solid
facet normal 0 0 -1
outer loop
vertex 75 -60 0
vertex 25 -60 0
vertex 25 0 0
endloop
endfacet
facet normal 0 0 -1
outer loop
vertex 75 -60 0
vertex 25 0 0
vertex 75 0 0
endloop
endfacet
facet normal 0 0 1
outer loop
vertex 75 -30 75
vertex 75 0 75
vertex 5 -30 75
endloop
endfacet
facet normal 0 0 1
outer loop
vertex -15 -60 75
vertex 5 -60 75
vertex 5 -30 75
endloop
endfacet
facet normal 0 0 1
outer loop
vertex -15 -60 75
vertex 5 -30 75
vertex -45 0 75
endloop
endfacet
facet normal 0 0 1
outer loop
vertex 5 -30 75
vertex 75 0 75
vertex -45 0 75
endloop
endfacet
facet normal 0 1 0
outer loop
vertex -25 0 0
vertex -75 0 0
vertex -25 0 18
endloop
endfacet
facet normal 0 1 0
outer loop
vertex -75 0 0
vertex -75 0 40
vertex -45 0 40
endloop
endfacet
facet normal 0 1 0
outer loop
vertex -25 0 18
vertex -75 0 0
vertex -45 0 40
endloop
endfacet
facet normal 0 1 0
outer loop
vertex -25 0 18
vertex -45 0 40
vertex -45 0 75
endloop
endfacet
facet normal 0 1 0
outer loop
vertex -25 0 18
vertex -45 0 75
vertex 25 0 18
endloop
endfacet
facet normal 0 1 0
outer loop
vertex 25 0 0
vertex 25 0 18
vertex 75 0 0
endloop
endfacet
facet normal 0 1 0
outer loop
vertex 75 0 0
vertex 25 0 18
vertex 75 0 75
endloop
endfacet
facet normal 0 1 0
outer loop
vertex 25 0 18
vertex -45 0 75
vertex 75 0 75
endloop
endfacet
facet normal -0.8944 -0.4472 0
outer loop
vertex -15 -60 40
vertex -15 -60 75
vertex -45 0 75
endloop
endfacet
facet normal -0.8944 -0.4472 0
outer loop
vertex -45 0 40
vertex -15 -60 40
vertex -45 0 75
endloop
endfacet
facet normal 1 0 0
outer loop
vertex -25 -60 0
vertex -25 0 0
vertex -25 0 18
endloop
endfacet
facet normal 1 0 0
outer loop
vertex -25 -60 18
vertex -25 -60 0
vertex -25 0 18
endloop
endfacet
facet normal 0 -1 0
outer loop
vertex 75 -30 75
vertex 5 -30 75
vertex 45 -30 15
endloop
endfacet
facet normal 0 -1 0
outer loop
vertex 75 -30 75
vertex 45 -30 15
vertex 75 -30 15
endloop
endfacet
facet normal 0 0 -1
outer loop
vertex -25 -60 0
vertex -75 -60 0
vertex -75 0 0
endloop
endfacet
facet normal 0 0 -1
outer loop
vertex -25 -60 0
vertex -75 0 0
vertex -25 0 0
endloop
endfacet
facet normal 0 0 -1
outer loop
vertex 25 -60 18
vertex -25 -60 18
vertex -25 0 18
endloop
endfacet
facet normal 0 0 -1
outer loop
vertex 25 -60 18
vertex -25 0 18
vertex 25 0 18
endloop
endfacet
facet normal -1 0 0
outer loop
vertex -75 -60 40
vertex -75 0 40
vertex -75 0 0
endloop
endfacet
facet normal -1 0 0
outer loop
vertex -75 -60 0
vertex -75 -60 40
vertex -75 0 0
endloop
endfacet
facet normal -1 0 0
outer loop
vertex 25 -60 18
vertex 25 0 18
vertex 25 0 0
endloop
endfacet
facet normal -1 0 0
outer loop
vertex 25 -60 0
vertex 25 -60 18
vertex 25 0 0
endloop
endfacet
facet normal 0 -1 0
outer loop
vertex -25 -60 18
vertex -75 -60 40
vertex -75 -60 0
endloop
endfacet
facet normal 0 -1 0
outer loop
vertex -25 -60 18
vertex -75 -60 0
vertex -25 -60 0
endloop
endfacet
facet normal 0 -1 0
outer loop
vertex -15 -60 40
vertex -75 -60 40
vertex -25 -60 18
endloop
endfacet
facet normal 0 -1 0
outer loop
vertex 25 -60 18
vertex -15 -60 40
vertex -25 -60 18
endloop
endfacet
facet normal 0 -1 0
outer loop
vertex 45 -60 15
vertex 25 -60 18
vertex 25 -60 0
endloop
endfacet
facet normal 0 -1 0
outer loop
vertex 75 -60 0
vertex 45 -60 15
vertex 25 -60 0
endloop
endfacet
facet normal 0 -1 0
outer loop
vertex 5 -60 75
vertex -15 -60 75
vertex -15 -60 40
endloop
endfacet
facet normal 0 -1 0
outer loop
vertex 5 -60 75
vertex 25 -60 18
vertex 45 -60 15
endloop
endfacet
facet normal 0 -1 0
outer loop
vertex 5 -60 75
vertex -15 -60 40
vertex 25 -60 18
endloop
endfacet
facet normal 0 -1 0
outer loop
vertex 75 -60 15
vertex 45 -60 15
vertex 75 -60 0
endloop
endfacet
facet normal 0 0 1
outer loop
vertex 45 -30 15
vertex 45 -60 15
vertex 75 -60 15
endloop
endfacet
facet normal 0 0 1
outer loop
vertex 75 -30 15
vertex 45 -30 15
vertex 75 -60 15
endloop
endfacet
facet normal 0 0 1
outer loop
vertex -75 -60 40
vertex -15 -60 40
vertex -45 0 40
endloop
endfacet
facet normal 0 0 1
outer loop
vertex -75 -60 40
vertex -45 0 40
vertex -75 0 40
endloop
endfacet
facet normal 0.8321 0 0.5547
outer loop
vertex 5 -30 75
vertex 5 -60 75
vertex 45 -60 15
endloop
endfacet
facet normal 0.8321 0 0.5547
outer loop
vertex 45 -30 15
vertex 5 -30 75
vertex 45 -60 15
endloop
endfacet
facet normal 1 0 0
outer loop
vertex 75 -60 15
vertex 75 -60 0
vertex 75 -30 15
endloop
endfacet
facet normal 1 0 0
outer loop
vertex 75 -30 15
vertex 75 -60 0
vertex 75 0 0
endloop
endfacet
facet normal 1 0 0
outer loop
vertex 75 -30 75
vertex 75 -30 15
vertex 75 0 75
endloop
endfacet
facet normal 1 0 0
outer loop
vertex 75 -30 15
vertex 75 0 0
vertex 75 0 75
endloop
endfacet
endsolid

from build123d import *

# Parameters (mm, degrees)
F1_DEPTH = 60
F3_DEPTH = 30
F5_DEPTH = 35


with BuildPart() as f1:
    # F0 (on Front) → F1 (new body)
    with BuildSketch(Plane.XZ):
        Polygon((-75, 40), (-75, 0), (-25, 0), (-25, 18), (25, 18), (25, 0), (75, 0), (75, 75), (-45, 75), (-45, 40), align=None)
    extrude(amount=F1_DEPTH)

    # F2 (on face) → F3 (cut)
    with BuildSketch(Plane.XZ.offset(60)):
        Polygon((75, 15), (75, 75), (5, 75), (45, 15), align=None)
    extrude(amount=-F3_DEPTH, mode=Mode.SUBTRACT)

    # F4 (on face) → F5 (cut)
    with BuildSketch(Plane.XY.offset(75)):
        Polygon((-15, -60), (-45, 0), (-45, -60), align=None)
    extrude(amount=-F5_DEPTH, mode=Mode.SUBTRACT)


solid = f1.part
